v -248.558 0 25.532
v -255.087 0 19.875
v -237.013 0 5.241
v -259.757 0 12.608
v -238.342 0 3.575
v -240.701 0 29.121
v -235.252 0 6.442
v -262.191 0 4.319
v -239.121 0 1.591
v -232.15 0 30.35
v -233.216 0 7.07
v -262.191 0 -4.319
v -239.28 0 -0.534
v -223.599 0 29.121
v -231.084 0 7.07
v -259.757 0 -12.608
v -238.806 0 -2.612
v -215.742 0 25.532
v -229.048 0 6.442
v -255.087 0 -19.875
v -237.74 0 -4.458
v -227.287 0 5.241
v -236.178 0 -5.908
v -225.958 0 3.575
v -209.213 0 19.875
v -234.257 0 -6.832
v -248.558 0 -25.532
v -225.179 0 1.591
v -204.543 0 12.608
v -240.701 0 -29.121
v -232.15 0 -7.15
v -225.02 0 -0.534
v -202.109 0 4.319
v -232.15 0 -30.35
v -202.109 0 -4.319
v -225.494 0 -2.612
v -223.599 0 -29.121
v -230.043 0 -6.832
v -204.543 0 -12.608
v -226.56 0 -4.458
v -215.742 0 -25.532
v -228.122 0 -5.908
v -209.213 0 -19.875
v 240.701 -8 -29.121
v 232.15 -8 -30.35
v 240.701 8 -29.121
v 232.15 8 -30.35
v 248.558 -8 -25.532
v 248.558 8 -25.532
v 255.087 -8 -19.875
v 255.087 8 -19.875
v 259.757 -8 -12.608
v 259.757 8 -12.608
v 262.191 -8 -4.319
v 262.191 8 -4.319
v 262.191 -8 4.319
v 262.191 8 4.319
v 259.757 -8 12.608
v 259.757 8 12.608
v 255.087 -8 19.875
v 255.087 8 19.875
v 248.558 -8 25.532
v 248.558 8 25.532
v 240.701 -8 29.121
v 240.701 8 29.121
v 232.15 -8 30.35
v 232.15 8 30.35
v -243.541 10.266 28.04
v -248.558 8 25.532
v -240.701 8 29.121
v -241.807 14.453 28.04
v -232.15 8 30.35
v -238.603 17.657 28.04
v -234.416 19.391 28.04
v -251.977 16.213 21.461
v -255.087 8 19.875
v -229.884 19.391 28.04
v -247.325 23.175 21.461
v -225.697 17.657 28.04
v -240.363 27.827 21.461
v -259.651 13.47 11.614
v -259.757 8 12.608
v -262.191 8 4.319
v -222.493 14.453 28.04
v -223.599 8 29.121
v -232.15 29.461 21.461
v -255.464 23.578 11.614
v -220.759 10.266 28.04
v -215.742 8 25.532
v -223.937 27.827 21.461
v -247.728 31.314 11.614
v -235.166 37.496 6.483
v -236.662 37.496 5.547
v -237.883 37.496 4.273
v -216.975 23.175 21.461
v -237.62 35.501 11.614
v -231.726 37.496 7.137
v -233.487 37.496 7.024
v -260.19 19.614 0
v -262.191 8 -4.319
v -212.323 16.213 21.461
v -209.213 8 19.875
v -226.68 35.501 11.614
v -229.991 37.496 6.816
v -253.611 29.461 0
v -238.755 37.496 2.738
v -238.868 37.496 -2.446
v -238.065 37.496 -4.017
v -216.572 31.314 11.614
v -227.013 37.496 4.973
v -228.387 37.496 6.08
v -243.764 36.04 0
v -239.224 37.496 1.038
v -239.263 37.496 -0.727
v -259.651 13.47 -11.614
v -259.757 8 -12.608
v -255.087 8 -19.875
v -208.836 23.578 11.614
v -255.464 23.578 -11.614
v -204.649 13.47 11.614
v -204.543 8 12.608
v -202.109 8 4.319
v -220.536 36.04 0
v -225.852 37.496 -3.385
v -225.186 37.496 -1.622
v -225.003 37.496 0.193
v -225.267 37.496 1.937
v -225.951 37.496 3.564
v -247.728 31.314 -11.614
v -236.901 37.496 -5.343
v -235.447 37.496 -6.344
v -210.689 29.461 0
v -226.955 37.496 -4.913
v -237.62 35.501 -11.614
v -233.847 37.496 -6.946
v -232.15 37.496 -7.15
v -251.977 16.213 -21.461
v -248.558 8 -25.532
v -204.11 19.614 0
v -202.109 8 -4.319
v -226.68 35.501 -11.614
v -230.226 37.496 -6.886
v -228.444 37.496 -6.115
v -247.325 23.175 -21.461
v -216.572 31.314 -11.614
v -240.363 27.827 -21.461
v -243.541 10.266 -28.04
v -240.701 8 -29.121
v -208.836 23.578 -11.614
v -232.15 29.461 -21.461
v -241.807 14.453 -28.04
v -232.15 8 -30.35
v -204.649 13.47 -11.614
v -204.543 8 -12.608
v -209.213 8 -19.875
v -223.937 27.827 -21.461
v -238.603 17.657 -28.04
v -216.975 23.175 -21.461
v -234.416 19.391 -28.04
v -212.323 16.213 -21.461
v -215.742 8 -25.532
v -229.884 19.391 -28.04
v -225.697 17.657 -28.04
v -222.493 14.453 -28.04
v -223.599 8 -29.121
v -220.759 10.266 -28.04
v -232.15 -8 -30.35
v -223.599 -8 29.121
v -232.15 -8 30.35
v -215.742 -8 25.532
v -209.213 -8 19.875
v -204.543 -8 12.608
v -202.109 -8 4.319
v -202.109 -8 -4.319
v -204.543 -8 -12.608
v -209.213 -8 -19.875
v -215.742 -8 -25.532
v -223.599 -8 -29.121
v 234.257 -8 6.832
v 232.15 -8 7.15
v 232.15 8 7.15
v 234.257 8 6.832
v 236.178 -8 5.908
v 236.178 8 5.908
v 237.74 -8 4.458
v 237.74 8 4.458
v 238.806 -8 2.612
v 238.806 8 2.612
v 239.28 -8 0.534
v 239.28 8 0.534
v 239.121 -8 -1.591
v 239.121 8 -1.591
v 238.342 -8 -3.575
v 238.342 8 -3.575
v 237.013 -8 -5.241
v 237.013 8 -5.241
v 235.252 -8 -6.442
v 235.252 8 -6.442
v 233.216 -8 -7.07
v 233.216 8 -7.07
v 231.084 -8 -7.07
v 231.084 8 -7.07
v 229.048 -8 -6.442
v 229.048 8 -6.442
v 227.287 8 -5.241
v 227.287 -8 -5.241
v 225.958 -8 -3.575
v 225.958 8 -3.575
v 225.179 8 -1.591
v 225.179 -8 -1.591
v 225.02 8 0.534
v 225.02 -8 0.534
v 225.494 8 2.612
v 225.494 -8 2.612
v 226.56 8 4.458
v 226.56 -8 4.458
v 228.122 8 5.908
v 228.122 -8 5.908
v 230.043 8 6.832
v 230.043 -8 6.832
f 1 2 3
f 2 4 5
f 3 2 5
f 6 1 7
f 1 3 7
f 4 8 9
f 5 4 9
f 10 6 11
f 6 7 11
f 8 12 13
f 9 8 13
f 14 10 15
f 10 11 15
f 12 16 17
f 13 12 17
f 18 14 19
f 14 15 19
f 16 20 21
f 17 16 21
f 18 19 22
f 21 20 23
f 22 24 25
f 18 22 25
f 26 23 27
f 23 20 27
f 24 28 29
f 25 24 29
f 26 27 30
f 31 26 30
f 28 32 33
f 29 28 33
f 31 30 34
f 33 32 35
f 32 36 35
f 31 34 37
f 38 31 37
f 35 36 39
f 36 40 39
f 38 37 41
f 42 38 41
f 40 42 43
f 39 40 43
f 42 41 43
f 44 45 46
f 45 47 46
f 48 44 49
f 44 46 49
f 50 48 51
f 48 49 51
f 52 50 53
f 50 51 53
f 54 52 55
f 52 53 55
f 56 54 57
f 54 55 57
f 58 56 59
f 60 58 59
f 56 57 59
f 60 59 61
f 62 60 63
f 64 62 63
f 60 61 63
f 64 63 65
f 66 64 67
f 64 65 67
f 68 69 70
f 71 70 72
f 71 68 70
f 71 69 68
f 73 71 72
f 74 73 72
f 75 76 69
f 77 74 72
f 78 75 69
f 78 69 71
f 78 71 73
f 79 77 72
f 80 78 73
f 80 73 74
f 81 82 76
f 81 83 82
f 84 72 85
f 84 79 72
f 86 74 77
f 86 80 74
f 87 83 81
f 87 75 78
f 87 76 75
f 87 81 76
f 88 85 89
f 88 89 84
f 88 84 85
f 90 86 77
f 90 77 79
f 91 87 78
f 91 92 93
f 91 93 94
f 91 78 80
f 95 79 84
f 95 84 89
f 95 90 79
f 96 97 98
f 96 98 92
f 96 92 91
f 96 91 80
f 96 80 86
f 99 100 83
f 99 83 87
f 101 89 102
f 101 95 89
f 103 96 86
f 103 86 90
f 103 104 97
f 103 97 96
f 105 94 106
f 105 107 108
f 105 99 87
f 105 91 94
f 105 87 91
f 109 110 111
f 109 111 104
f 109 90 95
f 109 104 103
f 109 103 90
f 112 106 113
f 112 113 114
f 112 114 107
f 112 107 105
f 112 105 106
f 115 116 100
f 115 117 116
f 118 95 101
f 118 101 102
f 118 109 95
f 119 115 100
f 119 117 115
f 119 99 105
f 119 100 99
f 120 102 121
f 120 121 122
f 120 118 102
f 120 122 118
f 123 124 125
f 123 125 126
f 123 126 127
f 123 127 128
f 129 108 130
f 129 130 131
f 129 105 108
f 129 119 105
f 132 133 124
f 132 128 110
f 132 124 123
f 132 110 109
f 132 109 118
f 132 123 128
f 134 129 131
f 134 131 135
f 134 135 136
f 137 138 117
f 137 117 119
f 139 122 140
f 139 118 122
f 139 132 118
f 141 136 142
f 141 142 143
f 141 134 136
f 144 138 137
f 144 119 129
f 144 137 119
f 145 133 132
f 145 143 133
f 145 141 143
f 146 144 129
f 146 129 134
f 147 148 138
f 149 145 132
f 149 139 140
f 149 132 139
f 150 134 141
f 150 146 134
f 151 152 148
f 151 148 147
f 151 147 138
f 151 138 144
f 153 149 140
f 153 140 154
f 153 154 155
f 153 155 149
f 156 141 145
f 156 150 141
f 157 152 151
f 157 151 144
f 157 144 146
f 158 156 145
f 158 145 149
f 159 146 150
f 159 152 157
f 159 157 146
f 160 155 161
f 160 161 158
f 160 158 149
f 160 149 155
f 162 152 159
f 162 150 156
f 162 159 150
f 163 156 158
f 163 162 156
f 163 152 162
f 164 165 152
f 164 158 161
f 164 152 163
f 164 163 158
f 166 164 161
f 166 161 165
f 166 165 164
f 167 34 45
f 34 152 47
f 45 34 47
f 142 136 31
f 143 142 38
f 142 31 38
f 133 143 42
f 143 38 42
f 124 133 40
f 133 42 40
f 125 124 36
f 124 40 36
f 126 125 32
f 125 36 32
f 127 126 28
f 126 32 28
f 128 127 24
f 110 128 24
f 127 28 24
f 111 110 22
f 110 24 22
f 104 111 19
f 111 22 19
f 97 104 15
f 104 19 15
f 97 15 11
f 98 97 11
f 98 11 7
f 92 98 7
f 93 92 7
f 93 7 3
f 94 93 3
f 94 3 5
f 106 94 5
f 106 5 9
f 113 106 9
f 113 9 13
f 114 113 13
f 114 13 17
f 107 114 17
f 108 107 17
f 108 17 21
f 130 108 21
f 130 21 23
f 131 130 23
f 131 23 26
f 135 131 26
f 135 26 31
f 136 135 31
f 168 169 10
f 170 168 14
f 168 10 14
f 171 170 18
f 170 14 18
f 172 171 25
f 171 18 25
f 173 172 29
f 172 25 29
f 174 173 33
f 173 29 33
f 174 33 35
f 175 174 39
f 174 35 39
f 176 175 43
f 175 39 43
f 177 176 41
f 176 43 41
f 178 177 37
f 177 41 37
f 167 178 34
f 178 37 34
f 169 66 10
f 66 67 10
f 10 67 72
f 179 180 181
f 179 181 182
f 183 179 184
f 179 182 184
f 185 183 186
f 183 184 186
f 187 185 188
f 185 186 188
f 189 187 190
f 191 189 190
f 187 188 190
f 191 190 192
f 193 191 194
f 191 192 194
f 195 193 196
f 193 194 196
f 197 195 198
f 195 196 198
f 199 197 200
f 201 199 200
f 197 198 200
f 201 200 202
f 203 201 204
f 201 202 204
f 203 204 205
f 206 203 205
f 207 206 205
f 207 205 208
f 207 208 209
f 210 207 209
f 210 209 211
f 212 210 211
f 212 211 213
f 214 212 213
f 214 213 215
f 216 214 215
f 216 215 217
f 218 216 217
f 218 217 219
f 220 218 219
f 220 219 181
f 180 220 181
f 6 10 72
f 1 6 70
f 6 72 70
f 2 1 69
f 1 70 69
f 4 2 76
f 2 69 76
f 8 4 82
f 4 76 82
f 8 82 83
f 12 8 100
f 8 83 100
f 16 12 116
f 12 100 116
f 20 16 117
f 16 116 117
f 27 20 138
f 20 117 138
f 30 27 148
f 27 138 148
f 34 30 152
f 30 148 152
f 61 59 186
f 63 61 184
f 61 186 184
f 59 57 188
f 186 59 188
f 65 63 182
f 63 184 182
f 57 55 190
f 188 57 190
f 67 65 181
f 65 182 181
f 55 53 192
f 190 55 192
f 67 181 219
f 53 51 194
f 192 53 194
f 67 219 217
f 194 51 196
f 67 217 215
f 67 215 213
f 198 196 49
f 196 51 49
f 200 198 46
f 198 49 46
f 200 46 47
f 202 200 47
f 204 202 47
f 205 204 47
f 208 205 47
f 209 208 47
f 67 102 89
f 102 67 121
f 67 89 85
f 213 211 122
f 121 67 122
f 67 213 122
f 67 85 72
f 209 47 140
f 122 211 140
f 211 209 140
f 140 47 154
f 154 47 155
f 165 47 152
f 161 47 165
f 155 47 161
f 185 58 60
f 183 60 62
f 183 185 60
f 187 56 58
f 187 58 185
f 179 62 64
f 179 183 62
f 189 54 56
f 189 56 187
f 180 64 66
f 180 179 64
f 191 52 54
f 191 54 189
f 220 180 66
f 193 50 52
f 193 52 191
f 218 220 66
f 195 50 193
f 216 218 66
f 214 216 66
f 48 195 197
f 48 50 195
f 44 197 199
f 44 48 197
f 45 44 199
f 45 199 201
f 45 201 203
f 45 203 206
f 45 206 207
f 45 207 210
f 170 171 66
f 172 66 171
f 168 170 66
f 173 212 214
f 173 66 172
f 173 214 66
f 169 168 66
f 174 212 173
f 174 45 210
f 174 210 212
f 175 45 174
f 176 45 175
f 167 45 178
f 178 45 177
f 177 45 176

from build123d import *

# Parameters (mm, degrees)
BOSS_EXTRU_1_DEPTH      = 8
ESQUISSE2_R             = 7.15
ENL_V_MAT_EXTRU_1_DEPTH = 265.732643435
R_VOLUTION1_ANGLE       = 180
ESQUISSE4_R             = 7.15
ENL_V_MAT_EXTRU_2_DEPTH = 269.282863784
ESQUISSE5_R             = 30.35
ENL_V_MAT_EXTRU_6_DEPTH = 8


with BuildPart() as part:
    # Esquisse1 → Boss.-Extru.1 (new, symmetric)
    with BuildSketch(Plane(origin=(0, 0, 0), x_dir=(1, 0, 0), z_dir=(0, 1, 0))):
        with BuildLine():
            Line((-232.15, 30.35), (232.15, 30.35))
            ThreePointArc((232.15, 30.35), (262.5, 0), (232.15, -30.35))
            Line((232.15, -30.35), (-232.15, -30.35))
            ThreePointArc((-232.15, -30.35), (-262.5, 0), (-232.15, 30.35))
        make_face()
    extrude(amount=BOSS_EXTRU_1_DEPTH, both=True)

    # Esquisse2 → Enlèv. mat.-Extru.1 (cut, through all)
    with BuildSketch(Plane(origin=(0, 8, 0), x_dir=(1, 0, 0), z_dir=(0, 1, 0))):
        with Locations(Location((232.15, 0, 0), (0, 0, 270))):
            Circle(ESQUISSE2_R)
    extrude(amount=-ENL_V_MAT_EXTRU_1_DEPTH, mode=Mode.SUBTRACT)

    # Esquisse3 → Révolution1 (revolve)
    with BuildSketch(Plane(origin=(0, 8, 0), x_dir=(1, 0, 0), z_dir=(0, 1, 0))):
        with BuildLine():
            Line((-232.15, 30.35), (-232.15, -30.35))
            ThreePointArc((-232.15, -30.35), (-262.5, 0), (-232.15, 30.35))
        make_face()
    revolve(axis=Axis((-232.15, 8, -30.35), (0, 0, -1)), revolution_arc=R_VOLUTION1_ANGLE)

    # Esquisse4 → Enlèv. mat.-Extru.2 (cut, through all)
    with BuildSketch(Plane.XZ.offset(8)):
        with Locations(Location((-232.15, 0, 0), (0, 0, 270))):
            Circle(ESQUISSE4_R)
    extrude(amount=-ENL_V_MAT_EXTRU_2_DEPTH, mode=Mode.SUBTRACT)

    # Esquisse5 → Enlèv. mat.-Extru.6 (cut)
    with BuildSketch(Plane(origin=(0, 0, 0), x_dir=(1, 0, 0), z_dir=(0, 1, 0))):
        with Locations((-232.15, 0)):
            Circle(ESQUISSE5_R)
    extrude(amount=-ENL_V_MAT_EXTRU_6_DEPTH, mode=Mode.SUBTRACT)


solid = part.part
